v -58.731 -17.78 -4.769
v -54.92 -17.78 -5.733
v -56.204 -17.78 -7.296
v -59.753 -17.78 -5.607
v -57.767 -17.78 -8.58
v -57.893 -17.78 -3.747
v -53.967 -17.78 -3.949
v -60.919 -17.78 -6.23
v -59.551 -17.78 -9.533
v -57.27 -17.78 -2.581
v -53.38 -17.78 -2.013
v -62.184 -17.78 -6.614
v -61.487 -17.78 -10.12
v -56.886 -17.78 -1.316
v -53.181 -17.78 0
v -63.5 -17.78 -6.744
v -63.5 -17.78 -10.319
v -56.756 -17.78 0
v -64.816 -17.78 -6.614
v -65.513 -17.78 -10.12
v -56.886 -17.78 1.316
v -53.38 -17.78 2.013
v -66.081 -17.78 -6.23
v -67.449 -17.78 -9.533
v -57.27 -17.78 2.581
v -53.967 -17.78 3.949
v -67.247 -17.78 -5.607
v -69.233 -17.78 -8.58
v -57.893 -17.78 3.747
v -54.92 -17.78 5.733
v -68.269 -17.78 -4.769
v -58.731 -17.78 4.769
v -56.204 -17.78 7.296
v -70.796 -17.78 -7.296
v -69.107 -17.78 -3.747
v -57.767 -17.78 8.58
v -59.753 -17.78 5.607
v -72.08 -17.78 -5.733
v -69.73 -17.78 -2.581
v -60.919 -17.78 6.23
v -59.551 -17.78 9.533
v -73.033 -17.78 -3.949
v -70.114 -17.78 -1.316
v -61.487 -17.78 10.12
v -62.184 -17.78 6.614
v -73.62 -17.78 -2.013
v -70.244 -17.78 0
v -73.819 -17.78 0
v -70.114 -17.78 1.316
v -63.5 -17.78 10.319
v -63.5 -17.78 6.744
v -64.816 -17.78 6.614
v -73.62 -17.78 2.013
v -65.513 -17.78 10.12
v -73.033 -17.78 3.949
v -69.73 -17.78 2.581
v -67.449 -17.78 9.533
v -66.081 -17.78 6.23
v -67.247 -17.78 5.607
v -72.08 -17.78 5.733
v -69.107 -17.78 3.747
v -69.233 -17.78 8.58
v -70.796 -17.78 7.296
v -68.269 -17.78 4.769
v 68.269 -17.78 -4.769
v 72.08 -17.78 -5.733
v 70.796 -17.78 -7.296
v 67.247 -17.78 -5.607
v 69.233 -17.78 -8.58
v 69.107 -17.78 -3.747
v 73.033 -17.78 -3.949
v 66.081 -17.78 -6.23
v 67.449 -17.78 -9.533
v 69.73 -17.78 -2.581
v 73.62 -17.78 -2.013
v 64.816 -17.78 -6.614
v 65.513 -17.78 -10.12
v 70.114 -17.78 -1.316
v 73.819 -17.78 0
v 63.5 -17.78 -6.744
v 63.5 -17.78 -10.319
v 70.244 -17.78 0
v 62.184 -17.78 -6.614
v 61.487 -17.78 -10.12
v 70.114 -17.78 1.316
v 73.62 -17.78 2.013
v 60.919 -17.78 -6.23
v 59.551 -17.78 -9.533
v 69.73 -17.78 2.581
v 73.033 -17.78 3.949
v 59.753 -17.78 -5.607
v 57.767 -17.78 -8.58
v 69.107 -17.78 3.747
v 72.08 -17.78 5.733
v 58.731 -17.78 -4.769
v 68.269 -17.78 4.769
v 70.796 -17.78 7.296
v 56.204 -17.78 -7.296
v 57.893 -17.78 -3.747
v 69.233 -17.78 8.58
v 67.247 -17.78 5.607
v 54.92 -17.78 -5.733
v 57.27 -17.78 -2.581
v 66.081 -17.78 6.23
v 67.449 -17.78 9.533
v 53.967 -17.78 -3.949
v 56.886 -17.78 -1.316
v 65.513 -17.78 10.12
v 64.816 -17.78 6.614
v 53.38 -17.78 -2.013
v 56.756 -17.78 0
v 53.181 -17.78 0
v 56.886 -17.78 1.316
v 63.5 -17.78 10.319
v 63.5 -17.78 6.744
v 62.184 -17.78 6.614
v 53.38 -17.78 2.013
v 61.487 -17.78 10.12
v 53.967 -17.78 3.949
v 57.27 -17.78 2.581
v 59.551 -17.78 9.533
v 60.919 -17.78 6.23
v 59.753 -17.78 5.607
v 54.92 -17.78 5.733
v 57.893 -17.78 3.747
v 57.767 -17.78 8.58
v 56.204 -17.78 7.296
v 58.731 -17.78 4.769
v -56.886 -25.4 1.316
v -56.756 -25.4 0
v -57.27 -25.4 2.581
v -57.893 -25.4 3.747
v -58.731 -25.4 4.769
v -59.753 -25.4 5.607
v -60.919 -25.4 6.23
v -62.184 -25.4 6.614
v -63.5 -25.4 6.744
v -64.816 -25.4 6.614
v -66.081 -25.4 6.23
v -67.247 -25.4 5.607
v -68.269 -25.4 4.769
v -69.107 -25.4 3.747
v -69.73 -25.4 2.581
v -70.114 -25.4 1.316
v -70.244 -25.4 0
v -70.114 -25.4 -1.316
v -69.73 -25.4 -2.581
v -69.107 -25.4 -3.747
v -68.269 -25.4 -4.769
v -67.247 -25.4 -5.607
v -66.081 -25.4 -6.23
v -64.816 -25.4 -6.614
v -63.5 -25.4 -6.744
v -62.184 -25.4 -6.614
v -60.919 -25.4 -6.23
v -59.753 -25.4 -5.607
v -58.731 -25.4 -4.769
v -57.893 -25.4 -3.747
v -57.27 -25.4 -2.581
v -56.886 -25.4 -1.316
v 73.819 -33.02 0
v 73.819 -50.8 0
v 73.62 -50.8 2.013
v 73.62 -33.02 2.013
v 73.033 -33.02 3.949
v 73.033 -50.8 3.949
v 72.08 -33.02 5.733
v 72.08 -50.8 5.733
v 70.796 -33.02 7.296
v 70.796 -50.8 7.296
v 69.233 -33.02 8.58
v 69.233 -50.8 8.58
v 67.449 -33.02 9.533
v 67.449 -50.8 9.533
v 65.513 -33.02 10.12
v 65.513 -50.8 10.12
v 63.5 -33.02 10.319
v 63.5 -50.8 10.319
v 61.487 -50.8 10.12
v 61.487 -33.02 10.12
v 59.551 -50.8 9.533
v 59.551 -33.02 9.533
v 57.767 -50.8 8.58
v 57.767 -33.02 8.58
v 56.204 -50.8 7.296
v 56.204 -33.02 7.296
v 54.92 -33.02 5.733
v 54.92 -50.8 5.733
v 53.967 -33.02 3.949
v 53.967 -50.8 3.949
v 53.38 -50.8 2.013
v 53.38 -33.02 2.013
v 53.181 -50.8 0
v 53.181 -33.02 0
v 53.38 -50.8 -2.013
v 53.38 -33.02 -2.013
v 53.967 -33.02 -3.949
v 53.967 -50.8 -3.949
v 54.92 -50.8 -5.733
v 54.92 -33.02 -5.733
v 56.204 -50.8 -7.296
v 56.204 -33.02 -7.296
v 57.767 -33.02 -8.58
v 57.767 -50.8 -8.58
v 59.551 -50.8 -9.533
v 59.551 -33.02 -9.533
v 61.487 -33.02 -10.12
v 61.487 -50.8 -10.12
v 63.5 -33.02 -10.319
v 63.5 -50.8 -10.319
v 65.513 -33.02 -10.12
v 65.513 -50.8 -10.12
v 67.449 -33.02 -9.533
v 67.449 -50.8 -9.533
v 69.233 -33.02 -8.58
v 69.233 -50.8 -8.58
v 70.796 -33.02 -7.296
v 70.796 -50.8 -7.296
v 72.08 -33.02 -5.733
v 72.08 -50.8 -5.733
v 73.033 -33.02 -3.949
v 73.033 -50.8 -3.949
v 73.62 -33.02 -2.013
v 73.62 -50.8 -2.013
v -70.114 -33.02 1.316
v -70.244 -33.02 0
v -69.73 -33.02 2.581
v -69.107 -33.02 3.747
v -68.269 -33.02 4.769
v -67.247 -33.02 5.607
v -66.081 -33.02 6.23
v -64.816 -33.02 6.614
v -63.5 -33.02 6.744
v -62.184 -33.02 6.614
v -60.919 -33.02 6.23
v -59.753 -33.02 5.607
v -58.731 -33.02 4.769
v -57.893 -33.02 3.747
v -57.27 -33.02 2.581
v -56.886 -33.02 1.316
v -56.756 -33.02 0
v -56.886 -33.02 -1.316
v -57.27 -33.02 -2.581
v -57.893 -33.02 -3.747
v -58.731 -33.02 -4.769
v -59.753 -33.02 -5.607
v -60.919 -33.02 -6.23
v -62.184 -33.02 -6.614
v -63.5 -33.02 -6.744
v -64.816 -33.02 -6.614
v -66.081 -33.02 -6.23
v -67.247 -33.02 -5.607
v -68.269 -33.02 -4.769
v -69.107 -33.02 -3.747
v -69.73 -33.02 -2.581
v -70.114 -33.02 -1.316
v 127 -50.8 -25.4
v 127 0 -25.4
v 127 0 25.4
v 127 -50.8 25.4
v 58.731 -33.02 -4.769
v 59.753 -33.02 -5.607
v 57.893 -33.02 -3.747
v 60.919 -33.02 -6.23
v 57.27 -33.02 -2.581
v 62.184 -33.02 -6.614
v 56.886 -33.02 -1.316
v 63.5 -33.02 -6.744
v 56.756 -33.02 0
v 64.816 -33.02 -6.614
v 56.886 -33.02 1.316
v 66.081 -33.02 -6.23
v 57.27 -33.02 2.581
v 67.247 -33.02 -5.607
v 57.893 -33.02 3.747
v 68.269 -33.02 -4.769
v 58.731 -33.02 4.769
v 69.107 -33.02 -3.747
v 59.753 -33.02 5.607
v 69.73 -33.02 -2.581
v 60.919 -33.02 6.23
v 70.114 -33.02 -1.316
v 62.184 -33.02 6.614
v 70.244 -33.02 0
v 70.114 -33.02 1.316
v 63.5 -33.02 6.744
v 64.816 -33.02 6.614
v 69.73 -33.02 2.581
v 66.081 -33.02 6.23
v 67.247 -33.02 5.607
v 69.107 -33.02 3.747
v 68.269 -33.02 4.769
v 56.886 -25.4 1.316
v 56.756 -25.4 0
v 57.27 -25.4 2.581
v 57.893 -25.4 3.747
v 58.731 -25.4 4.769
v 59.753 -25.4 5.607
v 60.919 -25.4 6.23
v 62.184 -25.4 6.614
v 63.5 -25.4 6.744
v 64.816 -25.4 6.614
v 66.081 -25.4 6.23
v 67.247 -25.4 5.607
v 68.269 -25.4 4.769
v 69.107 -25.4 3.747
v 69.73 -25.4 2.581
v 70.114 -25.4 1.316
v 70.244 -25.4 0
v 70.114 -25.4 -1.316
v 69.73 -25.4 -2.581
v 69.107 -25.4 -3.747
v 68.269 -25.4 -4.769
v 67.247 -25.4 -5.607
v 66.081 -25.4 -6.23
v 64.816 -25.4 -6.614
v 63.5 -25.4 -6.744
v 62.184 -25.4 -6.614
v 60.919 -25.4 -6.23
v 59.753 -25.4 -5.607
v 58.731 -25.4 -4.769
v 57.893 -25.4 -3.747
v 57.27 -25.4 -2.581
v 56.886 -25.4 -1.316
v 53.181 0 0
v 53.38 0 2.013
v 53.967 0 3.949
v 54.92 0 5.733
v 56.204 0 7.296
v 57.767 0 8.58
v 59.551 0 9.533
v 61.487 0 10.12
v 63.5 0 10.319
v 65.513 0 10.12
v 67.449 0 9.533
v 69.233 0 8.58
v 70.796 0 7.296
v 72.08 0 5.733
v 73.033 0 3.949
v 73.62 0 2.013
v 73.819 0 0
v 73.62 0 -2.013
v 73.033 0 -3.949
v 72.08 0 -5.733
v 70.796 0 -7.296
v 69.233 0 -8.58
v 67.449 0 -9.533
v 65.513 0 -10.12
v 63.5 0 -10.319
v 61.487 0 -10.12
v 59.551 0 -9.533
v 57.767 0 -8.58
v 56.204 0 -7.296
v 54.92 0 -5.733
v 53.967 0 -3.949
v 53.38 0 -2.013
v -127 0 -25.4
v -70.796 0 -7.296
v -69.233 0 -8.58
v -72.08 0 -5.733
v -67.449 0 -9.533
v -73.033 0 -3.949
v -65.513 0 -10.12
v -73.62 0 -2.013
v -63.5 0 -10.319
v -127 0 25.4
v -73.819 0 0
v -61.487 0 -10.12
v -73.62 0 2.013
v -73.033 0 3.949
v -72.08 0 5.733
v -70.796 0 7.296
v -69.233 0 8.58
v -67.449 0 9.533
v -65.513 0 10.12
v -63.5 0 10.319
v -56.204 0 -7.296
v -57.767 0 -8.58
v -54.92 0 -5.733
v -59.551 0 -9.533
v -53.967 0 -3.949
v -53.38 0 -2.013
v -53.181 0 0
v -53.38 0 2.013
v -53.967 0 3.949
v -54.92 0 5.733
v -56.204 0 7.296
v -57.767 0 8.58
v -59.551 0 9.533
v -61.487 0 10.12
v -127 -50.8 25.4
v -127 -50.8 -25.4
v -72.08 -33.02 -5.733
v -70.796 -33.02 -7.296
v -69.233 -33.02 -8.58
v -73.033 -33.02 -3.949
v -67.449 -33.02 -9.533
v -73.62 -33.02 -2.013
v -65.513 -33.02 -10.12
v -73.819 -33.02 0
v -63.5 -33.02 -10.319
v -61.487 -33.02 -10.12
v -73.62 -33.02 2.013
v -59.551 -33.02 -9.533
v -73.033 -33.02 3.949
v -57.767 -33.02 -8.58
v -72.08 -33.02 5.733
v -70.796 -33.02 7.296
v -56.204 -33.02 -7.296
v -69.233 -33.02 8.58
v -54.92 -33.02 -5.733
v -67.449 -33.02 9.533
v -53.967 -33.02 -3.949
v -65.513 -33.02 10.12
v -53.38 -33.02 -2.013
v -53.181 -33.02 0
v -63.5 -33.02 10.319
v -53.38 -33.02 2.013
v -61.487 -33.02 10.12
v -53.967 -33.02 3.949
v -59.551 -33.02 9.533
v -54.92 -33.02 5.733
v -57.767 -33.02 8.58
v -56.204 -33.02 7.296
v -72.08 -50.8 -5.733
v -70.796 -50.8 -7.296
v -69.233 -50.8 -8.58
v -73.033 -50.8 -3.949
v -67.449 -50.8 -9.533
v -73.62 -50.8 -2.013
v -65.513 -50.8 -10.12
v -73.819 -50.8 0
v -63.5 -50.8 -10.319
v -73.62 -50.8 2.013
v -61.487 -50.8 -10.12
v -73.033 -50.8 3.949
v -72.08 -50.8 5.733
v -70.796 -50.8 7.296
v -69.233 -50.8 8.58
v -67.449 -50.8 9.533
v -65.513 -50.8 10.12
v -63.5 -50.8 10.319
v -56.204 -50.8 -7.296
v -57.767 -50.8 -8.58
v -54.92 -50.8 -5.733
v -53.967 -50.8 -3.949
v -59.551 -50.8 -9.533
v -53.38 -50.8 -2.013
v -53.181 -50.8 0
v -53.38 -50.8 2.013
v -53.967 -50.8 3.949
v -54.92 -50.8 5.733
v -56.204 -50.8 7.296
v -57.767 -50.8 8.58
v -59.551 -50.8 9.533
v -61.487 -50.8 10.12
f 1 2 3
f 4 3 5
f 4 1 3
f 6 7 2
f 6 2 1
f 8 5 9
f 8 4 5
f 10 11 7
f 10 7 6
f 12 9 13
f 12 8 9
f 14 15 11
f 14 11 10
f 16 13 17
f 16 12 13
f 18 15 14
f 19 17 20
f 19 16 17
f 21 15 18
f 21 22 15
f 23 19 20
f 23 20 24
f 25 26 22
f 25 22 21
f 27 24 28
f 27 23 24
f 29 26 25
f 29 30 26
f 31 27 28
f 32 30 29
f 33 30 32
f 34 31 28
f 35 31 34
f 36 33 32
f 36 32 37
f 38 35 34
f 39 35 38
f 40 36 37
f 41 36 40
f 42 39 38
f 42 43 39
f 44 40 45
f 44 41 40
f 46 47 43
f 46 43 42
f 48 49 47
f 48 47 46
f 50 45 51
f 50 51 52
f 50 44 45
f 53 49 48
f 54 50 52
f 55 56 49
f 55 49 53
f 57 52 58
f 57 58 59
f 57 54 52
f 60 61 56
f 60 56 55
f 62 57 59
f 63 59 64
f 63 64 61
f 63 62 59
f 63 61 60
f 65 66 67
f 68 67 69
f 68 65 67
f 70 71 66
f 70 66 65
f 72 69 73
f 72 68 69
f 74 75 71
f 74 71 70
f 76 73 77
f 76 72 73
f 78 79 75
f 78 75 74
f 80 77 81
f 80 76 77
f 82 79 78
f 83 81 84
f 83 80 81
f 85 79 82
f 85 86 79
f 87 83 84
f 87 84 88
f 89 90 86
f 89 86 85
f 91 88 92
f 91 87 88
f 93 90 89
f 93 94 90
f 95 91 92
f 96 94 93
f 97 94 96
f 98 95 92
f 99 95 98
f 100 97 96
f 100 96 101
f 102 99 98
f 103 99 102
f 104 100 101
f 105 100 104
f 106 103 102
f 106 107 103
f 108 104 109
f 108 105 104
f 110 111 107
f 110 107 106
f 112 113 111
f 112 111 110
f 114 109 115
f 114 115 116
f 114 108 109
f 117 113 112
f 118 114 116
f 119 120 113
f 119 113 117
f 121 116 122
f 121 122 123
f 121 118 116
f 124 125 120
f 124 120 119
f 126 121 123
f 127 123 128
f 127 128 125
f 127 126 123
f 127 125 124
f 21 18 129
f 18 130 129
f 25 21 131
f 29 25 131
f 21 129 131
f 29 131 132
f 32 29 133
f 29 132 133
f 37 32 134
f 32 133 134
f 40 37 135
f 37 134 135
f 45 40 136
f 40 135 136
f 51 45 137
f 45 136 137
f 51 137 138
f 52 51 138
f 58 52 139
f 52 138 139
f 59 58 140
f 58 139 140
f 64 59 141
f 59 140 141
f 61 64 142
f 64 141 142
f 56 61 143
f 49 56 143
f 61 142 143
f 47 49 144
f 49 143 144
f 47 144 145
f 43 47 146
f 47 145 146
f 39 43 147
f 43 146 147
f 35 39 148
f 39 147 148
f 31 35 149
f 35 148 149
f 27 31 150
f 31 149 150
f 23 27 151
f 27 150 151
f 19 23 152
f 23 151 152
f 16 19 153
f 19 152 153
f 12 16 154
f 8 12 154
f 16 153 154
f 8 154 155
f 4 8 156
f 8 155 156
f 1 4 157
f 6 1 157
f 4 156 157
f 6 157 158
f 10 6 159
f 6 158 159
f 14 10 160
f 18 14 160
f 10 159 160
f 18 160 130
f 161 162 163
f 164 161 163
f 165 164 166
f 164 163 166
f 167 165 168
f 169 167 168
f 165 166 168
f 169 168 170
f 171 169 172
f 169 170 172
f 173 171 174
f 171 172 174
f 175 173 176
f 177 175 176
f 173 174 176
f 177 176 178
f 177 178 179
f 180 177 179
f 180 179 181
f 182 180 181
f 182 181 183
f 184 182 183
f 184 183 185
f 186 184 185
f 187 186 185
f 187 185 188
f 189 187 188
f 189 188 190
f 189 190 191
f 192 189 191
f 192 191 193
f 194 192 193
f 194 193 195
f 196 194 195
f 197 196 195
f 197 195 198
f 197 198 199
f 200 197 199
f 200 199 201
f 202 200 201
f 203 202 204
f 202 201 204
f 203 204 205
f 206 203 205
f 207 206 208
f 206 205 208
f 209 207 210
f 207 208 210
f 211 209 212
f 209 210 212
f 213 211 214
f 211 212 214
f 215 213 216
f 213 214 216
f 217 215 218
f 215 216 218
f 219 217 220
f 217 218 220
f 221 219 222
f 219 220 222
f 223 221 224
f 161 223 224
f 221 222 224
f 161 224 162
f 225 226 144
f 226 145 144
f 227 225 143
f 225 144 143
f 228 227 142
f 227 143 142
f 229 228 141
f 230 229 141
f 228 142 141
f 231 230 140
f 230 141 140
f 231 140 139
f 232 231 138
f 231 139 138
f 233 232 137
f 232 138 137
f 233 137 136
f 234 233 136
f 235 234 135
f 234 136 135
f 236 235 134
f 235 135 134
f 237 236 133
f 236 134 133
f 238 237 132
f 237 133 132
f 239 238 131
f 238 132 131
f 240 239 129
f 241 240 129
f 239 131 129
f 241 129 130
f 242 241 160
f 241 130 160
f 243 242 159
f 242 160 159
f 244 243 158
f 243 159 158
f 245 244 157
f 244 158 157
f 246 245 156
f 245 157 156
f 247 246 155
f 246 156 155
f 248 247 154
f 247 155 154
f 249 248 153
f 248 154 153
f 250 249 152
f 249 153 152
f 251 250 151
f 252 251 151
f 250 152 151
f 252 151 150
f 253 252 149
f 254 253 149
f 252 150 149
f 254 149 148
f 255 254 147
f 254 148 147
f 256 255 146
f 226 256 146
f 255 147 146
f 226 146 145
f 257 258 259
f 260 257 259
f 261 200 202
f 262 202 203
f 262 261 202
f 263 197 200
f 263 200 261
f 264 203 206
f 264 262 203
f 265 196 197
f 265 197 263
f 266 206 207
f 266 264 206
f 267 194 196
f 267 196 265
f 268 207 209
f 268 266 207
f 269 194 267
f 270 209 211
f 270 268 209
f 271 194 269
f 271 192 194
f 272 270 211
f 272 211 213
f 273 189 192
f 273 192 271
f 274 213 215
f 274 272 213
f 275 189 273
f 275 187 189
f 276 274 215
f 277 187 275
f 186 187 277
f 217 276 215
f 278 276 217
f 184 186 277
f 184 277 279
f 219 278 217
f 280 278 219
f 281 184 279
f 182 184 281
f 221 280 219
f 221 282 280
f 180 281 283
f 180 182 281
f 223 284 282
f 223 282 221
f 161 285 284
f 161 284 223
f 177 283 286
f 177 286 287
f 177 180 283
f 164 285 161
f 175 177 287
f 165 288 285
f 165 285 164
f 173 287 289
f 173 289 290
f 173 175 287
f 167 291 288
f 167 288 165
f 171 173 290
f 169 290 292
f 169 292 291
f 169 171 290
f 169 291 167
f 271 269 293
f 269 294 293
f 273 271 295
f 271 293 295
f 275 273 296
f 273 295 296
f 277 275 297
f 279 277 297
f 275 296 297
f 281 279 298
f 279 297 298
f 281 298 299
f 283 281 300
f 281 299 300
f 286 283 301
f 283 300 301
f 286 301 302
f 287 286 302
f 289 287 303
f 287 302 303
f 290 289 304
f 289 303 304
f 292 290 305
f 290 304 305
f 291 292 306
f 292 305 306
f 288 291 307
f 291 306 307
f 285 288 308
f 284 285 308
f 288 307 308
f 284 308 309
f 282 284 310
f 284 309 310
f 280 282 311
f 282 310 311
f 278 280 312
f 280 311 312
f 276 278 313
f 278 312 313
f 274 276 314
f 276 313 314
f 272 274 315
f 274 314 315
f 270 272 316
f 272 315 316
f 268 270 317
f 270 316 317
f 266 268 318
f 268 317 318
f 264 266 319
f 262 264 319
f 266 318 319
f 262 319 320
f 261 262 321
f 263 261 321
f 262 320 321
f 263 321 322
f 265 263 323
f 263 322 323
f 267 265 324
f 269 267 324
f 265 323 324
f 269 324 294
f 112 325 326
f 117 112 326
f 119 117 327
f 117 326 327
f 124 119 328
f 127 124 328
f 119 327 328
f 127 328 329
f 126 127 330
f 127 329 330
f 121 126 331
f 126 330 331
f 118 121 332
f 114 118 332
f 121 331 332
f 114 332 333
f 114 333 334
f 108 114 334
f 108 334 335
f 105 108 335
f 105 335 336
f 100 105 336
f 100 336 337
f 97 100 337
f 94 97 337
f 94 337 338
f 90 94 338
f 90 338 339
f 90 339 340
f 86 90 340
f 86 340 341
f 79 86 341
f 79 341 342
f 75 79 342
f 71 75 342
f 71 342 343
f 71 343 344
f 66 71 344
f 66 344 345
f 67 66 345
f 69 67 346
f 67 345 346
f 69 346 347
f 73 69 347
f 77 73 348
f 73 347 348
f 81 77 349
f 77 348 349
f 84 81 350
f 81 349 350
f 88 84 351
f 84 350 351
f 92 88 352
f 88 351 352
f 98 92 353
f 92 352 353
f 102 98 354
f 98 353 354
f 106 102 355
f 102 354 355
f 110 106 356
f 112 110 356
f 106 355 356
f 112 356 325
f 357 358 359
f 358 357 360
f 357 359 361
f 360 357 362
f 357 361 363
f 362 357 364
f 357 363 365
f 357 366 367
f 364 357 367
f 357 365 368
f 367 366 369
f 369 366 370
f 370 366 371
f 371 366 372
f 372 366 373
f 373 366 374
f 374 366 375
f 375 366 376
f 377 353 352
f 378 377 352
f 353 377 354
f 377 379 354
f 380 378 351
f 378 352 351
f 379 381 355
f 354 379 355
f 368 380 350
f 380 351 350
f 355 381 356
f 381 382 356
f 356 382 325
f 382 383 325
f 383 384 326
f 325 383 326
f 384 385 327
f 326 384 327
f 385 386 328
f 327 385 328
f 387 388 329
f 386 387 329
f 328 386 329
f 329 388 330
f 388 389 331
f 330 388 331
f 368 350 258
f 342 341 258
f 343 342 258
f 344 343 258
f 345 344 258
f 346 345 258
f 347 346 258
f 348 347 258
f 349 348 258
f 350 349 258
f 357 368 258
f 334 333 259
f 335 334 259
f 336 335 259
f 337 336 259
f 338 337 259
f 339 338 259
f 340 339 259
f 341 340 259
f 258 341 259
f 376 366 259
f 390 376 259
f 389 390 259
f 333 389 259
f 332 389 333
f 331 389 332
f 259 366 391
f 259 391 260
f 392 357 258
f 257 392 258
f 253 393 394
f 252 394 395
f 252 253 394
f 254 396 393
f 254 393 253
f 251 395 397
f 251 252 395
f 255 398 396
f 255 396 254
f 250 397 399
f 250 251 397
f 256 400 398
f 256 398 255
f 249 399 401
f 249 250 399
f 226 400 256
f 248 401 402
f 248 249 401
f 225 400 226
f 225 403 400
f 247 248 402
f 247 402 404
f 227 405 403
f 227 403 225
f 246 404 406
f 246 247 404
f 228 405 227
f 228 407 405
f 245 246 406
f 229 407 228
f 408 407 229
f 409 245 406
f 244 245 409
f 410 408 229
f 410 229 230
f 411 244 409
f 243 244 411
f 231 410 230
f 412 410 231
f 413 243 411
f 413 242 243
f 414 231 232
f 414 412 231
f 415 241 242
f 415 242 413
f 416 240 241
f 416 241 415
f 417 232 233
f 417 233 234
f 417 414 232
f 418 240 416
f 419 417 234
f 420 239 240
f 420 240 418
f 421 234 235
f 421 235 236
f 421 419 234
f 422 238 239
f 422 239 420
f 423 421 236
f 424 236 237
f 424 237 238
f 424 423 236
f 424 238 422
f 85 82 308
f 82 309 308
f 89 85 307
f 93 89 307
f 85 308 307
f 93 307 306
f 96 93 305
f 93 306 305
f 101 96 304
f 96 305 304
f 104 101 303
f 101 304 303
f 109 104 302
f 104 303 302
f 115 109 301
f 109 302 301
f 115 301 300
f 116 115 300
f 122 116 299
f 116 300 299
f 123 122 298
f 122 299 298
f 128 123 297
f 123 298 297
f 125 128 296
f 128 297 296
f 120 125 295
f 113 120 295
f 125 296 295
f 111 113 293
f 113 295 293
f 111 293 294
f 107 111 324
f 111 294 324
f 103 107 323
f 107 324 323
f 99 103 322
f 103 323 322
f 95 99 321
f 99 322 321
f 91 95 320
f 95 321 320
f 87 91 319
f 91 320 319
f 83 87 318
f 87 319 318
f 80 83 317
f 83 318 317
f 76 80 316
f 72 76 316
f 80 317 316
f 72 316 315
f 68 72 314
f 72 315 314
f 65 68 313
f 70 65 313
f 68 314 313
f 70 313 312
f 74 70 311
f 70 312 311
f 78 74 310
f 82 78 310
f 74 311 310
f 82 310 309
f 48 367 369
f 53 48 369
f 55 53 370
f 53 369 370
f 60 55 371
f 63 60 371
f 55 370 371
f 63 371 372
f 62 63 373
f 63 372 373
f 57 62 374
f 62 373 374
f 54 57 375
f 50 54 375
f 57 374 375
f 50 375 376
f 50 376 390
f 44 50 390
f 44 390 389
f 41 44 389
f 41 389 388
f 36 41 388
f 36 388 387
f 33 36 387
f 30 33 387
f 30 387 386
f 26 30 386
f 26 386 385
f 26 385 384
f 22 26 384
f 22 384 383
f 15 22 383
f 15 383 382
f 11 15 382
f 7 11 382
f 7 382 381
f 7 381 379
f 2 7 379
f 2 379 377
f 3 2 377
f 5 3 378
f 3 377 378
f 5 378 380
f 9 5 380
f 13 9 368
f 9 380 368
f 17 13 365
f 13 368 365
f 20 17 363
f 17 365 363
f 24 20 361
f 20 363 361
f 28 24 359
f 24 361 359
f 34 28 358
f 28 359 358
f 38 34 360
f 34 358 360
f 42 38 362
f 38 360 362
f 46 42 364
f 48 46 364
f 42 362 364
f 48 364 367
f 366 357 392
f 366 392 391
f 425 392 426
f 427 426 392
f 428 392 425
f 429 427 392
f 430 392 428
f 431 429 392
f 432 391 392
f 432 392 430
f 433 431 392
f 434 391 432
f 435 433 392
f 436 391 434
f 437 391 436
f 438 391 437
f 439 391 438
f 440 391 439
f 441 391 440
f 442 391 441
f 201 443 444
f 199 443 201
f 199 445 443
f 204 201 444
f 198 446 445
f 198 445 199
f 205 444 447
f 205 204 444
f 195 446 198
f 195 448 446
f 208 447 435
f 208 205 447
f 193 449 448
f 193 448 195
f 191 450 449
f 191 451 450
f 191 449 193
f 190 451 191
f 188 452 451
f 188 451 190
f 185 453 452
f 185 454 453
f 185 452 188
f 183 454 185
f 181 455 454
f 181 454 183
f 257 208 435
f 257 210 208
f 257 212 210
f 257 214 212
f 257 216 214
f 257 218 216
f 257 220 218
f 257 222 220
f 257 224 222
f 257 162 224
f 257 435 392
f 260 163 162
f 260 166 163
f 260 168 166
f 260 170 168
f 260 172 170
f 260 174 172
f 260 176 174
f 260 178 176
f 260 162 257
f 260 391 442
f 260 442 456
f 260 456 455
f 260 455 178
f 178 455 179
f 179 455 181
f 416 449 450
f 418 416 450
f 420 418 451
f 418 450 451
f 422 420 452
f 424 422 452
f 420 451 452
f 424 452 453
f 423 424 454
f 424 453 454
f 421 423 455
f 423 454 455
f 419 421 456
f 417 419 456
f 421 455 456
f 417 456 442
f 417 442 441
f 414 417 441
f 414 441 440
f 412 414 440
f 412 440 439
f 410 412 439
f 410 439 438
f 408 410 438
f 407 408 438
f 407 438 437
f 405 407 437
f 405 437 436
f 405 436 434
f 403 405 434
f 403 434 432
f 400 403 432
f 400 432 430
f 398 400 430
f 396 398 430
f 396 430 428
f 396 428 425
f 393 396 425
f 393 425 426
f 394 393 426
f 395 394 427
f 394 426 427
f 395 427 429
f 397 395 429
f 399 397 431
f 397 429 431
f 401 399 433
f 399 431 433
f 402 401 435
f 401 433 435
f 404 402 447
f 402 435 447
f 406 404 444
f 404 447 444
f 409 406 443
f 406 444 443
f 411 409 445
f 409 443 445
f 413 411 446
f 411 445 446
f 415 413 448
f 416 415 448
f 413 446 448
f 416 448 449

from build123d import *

# Parameters (mm, degrees)
F0_W           = 254
F0_H           = 50.8
F1_DEPTH       = 50.8
F3_D           = 13.4874
F3_DEPTH       = 25.4
F3_CBORE_D     = 20.6375
F3_CBORE_DEPTH = 17.78
F5_D           = 13.4874
F5_DEPTH       = 25.4
F5_CBORE_D     = 20.6375
F5_CBORE_DEPTH = 17.78


with BuildPart() as f1:
    # F0 (on Front) → F1 (new body)
    with BuildSketch(Plane.XZ):
        Rectangle(F0_W, F0_H)
    extrude(amount=F1_DEPTH)

    # F3
    with Locations(Plane(origin=(0, 0, 0), x_dir=(-1, 0, 0), z_dir=(0, 1, 0))):
        with Locations((-63.5, 0), (63.5, 0)):
            CounterBoreHole(F3_D / 2, F3_CBORE_D / 2, F3_CBORE_DEPTH, depth=F3_DEPTH)

    # F5
    with Locations(Plane.XZ.offset(50.8)):
        with Locations((-63.5, 0), (63.5, 0)):
            CounterBoreHole(F5_D / 2, F5_CBORE_D / 2, F5_CBORE_DEPTH, depth=F5_DEPTH)


solid = f1.part
